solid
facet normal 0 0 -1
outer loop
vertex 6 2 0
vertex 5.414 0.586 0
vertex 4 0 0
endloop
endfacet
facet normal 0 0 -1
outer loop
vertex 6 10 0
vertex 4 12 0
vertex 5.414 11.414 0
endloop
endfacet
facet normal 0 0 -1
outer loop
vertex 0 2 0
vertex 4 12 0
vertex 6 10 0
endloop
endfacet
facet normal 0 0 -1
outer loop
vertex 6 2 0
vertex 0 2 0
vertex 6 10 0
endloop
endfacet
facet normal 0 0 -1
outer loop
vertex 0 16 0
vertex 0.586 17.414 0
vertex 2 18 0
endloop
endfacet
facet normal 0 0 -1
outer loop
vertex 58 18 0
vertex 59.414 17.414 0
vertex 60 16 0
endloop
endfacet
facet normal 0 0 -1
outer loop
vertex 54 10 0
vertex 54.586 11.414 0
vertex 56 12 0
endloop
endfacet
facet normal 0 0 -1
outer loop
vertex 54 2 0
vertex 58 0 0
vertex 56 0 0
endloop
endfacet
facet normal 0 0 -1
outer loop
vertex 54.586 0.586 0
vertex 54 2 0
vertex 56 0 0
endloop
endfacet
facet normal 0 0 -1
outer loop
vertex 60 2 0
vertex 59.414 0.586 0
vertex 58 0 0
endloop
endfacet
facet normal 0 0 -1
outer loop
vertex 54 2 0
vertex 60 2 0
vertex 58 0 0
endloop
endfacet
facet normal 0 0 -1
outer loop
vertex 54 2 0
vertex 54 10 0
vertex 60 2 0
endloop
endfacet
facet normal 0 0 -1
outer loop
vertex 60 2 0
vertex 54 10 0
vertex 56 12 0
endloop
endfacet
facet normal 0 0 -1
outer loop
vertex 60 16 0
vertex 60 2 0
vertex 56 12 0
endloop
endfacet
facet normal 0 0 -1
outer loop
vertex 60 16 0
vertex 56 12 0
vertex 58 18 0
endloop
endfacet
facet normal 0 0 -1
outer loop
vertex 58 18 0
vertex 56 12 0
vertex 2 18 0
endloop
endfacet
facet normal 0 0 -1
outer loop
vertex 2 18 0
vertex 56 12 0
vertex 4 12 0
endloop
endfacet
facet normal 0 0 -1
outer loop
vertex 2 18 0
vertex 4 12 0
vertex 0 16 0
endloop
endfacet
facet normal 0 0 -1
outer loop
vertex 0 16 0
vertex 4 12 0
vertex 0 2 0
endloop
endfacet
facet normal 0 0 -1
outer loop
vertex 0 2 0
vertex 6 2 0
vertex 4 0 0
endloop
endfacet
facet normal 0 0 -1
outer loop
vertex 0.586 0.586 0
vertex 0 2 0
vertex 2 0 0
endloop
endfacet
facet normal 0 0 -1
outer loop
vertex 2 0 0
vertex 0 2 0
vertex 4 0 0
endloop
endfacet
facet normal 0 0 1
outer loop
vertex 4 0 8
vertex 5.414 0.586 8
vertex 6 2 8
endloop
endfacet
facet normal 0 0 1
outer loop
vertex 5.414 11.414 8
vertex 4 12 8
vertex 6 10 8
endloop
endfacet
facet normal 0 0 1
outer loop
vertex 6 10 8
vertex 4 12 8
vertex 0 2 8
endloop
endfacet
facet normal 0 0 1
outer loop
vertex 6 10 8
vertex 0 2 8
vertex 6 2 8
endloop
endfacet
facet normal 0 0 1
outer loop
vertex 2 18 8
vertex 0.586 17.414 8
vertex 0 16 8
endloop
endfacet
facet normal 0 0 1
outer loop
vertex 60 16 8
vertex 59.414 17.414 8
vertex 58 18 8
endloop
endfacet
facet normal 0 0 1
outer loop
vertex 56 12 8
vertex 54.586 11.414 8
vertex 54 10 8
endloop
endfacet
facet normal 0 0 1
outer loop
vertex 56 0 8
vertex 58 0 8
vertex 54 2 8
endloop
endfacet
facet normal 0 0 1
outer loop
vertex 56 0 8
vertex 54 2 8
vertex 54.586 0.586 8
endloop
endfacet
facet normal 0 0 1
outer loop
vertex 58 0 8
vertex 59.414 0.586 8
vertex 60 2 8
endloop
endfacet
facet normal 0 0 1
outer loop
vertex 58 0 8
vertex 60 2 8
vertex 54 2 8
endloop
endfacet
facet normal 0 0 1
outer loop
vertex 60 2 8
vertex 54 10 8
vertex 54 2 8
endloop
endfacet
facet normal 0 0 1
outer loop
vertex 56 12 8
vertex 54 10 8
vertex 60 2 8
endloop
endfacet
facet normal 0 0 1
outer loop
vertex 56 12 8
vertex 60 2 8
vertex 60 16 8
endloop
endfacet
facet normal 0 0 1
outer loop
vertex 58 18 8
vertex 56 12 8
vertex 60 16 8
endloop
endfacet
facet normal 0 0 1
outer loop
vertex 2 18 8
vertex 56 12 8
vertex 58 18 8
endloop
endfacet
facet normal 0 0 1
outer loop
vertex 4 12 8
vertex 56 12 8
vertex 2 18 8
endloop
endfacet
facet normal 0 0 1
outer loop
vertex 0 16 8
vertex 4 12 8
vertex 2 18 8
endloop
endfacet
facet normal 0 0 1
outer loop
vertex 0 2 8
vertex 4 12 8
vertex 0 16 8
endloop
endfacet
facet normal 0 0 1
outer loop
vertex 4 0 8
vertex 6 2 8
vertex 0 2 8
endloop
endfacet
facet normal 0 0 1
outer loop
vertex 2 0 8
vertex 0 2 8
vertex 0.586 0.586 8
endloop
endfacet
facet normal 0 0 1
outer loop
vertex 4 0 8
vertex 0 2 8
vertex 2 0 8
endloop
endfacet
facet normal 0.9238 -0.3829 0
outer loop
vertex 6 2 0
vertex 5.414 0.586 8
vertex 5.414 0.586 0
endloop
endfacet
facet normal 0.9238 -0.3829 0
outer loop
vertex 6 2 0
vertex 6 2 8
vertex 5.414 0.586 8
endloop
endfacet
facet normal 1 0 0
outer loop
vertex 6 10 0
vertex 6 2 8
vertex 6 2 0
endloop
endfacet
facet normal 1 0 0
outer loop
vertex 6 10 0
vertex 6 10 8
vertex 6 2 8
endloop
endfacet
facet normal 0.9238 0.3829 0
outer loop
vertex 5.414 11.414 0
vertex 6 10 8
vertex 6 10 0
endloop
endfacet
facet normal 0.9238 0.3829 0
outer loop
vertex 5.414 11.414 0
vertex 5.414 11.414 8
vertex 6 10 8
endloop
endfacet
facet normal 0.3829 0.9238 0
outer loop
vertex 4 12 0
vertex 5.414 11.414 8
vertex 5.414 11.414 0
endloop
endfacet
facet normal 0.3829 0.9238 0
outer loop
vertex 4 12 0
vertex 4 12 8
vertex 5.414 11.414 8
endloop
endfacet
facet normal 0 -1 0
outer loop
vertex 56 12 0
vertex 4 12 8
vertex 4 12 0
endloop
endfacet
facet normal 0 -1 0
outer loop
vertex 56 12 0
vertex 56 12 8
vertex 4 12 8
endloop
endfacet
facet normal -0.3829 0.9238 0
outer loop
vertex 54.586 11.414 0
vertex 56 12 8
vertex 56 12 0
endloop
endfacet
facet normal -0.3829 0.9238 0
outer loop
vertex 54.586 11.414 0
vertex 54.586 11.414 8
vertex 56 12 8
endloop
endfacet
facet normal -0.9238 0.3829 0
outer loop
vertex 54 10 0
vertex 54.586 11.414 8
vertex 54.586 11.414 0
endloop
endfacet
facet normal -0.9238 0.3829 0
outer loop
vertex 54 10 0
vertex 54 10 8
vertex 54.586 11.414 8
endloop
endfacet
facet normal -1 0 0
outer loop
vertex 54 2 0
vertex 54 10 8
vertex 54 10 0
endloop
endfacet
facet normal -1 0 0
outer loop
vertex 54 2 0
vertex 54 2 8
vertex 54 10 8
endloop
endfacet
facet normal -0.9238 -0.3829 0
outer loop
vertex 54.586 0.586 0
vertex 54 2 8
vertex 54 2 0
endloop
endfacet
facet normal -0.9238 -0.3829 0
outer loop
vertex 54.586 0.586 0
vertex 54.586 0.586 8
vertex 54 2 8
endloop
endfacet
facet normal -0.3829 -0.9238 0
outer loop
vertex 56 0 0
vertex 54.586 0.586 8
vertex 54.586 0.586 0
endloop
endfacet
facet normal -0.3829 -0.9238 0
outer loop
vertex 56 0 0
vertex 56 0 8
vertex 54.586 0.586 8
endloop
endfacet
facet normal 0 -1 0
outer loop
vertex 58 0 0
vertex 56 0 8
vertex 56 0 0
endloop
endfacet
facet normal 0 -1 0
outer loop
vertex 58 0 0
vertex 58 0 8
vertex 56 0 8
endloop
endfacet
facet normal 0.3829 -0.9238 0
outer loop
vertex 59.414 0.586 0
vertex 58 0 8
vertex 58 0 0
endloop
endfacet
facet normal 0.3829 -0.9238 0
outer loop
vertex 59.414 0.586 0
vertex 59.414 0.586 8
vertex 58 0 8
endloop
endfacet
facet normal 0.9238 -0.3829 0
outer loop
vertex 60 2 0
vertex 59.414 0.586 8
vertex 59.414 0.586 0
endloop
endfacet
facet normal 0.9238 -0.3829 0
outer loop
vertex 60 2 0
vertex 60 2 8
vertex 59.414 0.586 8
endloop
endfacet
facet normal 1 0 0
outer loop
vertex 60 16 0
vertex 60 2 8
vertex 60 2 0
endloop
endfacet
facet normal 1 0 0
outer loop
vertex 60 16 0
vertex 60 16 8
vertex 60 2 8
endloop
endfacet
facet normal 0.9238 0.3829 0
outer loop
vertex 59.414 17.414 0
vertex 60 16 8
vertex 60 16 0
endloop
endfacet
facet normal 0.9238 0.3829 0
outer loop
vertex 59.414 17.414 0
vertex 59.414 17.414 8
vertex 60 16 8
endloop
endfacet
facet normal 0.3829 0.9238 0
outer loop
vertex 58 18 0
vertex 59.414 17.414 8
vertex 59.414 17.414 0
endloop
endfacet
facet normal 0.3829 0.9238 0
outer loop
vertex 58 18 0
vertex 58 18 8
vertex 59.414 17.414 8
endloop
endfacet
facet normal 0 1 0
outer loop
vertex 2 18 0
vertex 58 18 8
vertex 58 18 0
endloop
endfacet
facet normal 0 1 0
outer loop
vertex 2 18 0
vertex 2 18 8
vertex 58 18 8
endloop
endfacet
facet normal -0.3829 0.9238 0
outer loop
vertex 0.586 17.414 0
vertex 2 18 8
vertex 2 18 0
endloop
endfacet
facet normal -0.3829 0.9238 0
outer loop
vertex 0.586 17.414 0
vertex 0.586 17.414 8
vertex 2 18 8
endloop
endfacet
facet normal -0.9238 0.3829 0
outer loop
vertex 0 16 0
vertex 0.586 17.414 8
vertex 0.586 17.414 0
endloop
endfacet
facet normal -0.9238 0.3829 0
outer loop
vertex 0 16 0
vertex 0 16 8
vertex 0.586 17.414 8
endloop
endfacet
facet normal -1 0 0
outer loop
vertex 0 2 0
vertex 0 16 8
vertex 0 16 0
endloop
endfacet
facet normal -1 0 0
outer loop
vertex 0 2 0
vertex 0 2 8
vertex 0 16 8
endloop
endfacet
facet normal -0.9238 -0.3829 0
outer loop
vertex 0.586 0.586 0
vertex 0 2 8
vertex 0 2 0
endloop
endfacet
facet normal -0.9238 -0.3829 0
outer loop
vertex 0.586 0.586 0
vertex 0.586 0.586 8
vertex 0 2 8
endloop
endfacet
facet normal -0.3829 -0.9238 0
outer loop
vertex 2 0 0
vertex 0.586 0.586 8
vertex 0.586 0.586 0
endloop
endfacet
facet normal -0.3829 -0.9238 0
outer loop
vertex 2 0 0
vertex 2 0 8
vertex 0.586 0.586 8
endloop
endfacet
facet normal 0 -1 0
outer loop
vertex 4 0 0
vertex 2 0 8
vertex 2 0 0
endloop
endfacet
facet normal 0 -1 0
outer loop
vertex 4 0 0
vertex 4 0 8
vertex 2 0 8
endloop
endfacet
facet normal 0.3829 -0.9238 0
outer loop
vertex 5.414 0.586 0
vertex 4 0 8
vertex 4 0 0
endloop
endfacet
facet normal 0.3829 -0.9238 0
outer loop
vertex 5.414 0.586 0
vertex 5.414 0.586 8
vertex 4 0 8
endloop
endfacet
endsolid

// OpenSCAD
$fn = 32;
// ----------------------------------------------------------------------
// Clip blank: staple clip, 8 mm thick
// ----------------------------------------------------------------------

// --- parameters (mm) ---
profile_height = 8;       // extrusion height
profile_points = 24;      // points of the closed outline

profile = [[0, 2], [0.586, 0.586], [2, 0], [4, 0], [5.414, 0.586], [6, 2], [6, 10], [5.414, 11.414], [4, 12], [56, 12], [54.586, 11.414], [54, 10], [54, 2], [54.586, 0.586], [56, 0], [58, 0], [59.414, 0.586], [60, 2], [60, 16], [59.414, 17.414], [58, 18], [2, 18], [0.586, 17.414], [0, 16]];  // single closed polygon, 24 points, counter clockwise

// --- the one profile operation ---
linear_extrude(height = profile_height) polygon(points = profile);
